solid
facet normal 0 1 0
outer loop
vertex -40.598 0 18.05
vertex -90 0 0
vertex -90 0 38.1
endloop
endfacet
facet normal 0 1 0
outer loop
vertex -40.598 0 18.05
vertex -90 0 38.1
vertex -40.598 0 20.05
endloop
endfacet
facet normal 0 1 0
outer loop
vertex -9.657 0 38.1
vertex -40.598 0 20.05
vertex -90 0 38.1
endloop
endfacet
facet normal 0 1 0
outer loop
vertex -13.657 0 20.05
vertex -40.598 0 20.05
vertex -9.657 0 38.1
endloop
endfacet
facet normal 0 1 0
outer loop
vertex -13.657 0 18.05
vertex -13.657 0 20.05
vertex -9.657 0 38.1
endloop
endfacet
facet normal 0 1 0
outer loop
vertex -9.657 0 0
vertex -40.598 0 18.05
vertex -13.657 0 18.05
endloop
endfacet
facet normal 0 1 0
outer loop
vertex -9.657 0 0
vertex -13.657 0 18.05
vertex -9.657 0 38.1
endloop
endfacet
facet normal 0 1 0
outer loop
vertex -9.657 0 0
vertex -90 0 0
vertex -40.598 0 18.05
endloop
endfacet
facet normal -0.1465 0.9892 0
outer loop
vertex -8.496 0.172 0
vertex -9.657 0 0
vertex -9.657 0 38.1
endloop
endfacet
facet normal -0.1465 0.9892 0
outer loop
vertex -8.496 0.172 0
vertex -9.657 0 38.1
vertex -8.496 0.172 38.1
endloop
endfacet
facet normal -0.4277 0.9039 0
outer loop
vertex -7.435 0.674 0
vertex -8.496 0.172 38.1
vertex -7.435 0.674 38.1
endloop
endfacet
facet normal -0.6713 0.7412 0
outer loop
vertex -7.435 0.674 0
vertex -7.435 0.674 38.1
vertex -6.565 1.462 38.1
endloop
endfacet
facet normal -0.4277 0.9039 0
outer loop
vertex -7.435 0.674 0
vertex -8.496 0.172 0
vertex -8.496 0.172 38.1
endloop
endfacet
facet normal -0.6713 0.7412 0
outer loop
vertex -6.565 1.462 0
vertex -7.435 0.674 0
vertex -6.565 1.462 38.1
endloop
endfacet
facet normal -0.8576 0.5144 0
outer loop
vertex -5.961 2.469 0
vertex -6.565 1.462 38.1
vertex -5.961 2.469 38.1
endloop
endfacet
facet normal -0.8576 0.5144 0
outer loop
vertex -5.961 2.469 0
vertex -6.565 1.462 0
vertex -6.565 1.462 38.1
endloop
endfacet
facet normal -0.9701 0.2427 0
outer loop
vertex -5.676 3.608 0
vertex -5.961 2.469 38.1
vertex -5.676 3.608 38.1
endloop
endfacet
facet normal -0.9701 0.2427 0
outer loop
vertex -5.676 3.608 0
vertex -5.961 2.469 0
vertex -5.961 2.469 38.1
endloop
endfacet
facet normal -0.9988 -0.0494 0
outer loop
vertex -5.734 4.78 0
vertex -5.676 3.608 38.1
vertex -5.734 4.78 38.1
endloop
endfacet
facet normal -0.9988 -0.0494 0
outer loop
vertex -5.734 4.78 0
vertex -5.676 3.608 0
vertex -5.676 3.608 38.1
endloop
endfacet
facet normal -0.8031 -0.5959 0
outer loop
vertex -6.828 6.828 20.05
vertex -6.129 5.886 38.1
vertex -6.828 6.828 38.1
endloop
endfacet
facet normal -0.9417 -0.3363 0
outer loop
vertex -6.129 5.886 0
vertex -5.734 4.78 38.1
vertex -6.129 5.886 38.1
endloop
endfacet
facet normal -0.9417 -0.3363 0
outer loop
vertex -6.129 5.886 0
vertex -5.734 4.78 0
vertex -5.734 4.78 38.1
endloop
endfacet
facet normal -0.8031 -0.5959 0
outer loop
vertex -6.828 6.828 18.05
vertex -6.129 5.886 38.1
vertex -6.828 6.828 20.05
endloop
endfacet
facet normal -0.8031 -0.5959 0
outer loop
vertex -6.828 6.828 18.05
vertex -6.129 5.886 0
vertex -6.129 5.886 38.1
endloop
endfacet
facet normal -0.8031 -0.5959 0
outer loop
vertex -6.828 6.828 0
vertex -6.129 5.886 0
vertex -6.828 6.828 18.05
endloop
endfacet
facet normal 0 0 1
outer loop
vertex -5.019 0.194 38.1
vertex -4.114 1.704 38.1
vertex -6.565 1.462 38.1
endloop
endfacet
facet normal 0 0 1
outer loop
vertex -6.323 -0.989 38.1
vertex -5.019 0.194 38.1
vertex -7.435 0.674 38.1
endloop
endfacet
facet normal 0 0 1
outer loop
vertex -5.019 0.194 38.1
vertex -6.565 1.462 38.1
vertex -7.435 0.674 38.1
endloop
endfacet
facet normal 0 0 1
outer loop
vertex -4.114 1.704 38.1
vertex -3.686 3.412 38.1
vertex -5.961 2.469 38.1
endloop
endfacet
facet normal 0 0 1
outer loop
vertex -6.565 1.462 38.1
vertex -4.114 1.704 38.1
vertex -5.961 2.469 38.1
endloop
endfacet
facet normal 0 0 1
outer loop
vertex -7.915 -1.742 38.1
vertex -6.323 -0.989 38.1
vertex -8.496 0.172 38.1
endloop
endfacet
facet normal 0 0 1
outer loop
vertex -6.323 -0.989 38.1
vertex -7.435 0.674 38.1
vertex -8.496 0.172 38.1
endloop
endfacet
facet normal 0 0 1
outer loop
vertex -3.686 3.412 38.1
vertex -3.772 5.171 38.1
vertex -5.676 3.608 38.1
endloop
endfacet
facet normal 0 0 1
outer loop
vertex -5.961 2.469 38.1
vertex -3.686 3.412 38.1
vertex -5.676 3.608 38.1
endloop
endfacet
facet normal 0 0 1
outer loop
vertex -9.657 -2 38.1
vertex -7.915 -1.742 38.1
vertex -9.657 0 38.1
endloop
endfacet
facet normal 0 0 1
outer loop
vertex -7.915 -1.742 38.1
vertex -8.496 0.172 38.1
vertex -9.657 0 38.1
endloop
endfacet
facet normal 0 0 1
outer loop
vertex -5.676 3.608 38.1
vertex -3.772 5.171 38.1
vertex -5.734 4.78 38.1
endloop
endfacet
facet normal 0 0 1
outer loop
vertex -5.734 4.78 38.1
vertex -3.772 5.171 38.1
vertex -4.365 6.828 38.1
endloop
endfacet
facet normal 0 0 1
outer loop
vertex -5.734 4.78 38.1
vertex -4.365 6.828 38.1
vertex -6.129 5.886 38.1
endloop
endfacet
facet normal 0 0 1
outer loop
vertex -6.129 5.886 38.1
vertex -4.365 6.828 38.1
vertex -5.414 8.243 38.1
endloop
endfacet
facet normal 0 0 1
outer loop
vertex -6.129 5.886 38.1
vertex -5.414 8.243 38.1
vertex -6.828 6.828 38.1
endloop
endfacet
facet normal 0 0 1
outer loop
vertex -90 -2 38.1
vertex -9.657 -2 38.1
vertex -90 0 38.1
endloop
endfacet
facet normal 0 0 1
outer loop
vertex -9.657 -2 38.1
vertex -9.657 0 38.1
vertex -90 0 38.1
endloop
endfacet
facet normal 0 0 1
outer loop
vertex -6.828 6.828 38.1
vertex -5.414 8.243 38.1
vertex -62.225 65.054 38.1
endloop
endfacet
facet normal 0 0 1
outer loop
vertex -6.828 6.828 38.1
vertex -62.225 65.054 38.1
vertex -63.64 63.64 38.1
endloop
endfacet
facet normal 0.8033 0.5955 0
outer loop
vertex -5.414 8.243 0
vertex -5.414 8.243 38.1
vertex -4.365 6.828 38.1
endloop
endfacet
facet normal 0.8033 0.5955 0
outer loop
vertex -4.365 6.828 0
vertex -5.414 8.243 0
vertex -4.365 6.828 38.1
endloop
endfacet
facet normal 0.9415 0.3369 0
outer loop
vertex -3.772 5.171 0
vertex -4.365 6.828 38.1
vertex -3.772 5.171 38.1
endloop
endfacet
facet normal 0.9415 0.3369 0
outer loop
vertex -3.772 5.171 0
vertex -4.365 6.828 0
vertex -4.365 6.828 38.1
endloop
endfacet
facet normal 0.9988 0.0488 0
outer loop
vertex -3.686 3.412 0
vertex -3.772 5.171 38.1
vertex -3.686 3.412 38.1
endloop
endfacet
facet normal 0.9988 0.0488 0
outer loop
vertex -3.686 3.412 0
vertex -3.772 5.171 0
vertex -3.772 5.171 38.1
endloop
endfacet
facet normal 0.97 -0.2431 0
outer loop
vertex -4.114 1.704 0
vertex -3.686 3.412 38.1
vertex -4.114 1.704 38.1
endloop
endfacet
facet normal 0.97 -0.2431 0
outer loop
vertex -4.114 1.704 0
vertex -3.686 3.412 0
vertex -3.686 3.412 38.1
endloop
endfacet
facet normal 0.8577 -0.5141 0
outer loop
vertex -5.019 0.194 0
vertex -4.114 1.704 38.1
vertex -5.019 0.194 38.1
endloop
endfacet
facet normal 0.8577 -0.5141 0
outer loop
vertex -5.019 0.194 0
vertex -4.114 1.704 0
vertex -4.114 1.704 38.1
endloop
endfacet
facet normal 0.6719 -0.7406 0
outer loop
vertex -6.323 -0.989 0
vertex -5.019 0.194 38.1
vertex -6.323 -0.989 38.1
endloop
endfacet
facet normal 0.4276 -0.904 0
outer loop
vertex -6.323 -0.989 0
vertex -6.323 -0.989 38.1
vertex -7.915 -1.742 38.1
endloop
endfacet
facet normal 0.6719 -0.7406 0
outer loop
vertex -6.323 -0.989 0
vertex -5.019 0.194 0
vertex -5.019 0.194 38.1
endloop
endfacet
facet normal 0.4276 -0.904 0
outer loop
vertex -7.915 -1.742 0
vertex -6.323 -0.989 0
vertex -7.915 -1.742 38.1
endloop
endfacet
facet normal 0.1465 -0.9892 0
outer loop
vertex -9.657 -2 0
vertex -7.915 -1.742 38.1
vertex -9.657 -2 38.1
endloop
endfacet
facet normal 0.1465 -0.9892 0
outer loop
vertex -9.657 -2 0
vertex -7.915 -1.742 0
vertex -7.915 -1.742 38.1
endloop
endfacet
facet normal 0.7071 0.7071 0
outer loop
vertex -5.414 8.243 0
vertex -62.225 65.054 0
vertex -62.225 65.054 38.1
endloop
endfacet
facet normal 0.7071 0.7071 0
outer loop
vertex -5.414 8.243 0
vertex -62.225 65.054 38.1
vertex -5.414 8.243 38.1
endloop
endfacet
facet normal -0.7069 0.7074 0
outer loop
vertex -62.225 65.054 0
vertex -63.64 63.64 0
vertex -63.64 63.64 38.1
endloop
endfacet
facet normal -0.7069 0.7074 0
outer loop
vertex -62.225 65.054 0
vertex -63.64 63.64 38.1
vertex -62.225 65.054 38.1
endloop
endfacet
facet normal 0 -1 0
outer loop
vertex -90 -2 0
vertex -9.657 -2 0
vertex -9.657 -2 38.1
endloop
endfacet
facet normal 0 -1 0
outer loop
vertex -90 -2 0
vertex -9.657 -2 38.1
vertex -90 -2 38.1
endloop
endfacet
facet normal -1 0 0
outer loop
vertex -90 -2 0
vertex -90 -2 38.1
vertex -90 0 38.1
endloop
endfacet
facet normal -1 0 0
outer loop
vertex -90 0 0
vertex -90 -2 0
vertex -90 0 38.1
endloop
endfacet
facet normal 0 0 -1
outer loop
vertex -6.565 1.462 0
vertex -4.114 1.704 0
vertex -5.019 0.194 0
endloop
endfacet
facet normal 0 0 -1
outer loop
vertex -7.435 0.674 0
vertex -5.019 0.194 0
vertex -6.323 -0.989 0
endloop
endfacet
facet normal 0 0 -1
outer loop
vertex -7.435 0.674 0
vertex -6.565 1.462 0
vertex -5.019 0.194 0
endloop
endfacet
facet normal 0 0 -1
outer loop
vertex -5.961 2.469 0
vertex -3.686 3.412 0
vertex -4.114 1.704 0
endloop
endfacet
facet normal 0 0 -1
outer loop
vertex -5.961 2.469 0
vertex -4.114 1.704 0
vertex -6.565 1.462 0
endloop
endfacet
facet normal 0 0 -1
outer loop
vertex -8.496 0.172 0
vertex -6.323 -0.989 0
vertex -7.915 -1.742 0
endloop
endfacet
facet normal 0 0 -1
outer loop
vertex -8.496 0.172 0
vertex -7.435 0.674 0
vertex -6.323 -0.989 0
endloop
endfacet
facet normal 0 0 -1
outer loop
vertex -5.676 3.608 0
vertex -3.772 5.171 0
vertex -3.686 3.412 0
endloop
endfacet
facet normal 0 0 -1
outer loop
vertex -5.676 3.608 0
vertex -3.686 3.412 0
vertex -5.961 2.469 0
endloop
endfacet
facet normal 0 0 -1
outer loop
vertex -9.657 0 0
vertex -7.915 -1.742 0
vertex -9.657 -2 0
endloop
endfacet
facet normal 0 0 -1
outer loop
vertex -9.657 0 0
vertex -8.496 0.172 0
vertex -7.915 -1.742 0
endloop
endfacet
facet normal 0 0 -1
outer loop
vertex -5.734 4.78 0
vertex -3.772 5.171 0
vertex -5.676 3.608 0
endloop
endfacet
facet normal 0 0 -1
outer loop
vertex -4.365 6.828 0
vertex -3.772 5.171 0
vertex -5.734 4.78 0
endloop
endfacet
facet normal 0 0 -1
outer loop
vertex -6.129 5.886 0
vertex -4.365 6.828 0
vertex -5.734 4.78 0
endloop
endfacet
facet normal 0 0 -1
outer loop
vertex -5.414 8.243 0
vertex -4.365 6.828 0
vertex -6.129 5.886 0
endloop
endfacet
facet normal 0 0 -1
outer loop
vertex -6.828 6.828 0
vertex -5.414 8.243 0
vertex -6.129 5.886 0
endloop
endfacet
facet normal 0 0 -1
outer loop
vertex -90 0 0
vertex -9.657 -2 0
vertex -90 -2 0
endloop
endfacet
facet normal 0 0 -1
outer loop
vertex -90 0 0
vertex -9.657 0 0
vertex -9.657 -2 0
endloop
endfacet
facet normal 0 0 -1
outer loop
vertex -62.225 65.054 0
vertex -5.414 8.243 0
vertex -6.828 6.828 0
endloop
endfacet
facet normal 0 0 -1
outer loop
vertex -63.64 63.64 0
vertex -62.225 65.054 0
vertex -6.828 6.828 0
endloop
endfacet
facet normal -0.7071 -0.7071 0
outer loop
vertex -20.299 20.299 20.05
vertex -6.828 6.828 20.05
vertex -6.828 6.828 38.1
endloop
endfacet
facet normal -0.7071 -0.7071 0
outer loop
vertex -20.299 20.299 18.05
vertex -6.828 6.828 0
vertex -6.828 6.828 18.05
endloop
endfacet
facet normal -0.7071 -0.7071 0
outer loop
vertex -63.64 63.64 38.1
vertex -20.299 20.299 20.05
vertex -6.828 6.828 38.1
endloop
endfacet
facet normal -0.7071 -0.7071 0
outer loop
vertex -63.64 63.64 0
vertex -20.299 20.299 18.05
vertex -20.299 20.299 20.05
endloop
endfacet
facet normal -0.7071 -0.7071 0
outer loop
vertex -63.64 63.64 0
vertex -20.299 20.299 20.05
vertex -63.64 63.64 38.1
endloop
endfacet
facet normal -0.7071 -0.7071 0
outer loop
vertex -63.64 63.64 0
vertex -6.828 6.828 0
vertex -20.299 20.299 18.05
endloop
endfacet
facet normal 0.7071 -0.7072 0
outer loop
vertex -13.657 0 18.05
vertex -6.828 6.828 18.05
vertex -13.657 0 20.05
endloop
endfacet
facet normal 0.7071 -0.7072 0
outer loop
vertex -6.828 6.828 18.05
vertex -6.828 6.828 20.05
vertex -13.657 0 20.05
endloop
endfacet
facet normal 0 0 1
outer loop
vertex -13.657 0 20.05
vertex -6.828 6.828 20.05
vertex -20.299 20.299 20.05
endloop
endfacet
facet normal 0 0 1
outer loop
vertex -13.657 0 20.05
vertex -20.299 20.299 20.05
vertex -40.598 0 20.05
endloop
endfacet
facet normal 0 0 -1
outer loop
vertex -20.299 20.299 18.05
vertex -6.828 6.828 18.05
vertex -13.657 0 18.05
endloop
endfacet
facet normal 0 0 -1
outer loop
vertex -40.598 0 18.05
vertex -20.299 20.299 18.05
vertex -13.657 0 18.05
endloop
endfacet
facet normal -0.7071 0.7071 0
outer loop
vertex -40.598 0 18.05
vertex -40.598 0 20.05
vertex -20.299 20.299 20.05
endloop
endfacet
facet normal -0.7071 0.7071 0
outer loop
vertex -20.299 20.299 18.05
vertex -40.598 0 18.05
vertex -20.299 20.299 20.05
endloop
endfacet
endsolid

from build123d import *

# Parameters (mm, degrees)
SALIENTE_EXTRUIR1_DEPTH = 38.1
SALIENTE_EXTRUIR2_DEPTH = 1


with BuildPart() as part:
    # Croquis1 → Saliente-Extruir1 (new body)
    with BuildSketch(Plane.XY):
        with BuildLine():
            Line((-6.828427125, 6.828427125), (-63.639610307, 63.639610307))
            Line((-63.639610307, 63.639610307), (-62.225396744, 65.053823869))
            Line((-62.225396744, 65.053823869), (-5.414213562, 8.242640687))
            ThreePointArc((-5.414213562, 8.242640687), (-4.113577054, 1.703899406), (-9.656854249, -2))
            Line((-9.656854249, -2), (-90, -2))
            Line((-90, -2), (-90, 0))
            Line((-90, 0), (-9.656854249, 0))
            ThreePointArc((-9.656854249, 0), (-5.961336119, 2.469266271), (-6.828427125, 6.828427125))
        make_face()
    extrude(amount=SALIENTE_EXTRUIR1_DEPTH)

    # Croquis3 → Saliente-Extruir2 (add, symmetric)
    with BuildSketch(Plane.XY.offset(19.05)):
        Polygon((-40.597622613, 0), (-20.298811306, 20.298811306), (-6.828427125, 6.828427125), (-13.656854249, 0), align=None)
    extrude(amount=SALIENTE_EXTRUIR2_DEPTH, both=True)


solid = part.part
